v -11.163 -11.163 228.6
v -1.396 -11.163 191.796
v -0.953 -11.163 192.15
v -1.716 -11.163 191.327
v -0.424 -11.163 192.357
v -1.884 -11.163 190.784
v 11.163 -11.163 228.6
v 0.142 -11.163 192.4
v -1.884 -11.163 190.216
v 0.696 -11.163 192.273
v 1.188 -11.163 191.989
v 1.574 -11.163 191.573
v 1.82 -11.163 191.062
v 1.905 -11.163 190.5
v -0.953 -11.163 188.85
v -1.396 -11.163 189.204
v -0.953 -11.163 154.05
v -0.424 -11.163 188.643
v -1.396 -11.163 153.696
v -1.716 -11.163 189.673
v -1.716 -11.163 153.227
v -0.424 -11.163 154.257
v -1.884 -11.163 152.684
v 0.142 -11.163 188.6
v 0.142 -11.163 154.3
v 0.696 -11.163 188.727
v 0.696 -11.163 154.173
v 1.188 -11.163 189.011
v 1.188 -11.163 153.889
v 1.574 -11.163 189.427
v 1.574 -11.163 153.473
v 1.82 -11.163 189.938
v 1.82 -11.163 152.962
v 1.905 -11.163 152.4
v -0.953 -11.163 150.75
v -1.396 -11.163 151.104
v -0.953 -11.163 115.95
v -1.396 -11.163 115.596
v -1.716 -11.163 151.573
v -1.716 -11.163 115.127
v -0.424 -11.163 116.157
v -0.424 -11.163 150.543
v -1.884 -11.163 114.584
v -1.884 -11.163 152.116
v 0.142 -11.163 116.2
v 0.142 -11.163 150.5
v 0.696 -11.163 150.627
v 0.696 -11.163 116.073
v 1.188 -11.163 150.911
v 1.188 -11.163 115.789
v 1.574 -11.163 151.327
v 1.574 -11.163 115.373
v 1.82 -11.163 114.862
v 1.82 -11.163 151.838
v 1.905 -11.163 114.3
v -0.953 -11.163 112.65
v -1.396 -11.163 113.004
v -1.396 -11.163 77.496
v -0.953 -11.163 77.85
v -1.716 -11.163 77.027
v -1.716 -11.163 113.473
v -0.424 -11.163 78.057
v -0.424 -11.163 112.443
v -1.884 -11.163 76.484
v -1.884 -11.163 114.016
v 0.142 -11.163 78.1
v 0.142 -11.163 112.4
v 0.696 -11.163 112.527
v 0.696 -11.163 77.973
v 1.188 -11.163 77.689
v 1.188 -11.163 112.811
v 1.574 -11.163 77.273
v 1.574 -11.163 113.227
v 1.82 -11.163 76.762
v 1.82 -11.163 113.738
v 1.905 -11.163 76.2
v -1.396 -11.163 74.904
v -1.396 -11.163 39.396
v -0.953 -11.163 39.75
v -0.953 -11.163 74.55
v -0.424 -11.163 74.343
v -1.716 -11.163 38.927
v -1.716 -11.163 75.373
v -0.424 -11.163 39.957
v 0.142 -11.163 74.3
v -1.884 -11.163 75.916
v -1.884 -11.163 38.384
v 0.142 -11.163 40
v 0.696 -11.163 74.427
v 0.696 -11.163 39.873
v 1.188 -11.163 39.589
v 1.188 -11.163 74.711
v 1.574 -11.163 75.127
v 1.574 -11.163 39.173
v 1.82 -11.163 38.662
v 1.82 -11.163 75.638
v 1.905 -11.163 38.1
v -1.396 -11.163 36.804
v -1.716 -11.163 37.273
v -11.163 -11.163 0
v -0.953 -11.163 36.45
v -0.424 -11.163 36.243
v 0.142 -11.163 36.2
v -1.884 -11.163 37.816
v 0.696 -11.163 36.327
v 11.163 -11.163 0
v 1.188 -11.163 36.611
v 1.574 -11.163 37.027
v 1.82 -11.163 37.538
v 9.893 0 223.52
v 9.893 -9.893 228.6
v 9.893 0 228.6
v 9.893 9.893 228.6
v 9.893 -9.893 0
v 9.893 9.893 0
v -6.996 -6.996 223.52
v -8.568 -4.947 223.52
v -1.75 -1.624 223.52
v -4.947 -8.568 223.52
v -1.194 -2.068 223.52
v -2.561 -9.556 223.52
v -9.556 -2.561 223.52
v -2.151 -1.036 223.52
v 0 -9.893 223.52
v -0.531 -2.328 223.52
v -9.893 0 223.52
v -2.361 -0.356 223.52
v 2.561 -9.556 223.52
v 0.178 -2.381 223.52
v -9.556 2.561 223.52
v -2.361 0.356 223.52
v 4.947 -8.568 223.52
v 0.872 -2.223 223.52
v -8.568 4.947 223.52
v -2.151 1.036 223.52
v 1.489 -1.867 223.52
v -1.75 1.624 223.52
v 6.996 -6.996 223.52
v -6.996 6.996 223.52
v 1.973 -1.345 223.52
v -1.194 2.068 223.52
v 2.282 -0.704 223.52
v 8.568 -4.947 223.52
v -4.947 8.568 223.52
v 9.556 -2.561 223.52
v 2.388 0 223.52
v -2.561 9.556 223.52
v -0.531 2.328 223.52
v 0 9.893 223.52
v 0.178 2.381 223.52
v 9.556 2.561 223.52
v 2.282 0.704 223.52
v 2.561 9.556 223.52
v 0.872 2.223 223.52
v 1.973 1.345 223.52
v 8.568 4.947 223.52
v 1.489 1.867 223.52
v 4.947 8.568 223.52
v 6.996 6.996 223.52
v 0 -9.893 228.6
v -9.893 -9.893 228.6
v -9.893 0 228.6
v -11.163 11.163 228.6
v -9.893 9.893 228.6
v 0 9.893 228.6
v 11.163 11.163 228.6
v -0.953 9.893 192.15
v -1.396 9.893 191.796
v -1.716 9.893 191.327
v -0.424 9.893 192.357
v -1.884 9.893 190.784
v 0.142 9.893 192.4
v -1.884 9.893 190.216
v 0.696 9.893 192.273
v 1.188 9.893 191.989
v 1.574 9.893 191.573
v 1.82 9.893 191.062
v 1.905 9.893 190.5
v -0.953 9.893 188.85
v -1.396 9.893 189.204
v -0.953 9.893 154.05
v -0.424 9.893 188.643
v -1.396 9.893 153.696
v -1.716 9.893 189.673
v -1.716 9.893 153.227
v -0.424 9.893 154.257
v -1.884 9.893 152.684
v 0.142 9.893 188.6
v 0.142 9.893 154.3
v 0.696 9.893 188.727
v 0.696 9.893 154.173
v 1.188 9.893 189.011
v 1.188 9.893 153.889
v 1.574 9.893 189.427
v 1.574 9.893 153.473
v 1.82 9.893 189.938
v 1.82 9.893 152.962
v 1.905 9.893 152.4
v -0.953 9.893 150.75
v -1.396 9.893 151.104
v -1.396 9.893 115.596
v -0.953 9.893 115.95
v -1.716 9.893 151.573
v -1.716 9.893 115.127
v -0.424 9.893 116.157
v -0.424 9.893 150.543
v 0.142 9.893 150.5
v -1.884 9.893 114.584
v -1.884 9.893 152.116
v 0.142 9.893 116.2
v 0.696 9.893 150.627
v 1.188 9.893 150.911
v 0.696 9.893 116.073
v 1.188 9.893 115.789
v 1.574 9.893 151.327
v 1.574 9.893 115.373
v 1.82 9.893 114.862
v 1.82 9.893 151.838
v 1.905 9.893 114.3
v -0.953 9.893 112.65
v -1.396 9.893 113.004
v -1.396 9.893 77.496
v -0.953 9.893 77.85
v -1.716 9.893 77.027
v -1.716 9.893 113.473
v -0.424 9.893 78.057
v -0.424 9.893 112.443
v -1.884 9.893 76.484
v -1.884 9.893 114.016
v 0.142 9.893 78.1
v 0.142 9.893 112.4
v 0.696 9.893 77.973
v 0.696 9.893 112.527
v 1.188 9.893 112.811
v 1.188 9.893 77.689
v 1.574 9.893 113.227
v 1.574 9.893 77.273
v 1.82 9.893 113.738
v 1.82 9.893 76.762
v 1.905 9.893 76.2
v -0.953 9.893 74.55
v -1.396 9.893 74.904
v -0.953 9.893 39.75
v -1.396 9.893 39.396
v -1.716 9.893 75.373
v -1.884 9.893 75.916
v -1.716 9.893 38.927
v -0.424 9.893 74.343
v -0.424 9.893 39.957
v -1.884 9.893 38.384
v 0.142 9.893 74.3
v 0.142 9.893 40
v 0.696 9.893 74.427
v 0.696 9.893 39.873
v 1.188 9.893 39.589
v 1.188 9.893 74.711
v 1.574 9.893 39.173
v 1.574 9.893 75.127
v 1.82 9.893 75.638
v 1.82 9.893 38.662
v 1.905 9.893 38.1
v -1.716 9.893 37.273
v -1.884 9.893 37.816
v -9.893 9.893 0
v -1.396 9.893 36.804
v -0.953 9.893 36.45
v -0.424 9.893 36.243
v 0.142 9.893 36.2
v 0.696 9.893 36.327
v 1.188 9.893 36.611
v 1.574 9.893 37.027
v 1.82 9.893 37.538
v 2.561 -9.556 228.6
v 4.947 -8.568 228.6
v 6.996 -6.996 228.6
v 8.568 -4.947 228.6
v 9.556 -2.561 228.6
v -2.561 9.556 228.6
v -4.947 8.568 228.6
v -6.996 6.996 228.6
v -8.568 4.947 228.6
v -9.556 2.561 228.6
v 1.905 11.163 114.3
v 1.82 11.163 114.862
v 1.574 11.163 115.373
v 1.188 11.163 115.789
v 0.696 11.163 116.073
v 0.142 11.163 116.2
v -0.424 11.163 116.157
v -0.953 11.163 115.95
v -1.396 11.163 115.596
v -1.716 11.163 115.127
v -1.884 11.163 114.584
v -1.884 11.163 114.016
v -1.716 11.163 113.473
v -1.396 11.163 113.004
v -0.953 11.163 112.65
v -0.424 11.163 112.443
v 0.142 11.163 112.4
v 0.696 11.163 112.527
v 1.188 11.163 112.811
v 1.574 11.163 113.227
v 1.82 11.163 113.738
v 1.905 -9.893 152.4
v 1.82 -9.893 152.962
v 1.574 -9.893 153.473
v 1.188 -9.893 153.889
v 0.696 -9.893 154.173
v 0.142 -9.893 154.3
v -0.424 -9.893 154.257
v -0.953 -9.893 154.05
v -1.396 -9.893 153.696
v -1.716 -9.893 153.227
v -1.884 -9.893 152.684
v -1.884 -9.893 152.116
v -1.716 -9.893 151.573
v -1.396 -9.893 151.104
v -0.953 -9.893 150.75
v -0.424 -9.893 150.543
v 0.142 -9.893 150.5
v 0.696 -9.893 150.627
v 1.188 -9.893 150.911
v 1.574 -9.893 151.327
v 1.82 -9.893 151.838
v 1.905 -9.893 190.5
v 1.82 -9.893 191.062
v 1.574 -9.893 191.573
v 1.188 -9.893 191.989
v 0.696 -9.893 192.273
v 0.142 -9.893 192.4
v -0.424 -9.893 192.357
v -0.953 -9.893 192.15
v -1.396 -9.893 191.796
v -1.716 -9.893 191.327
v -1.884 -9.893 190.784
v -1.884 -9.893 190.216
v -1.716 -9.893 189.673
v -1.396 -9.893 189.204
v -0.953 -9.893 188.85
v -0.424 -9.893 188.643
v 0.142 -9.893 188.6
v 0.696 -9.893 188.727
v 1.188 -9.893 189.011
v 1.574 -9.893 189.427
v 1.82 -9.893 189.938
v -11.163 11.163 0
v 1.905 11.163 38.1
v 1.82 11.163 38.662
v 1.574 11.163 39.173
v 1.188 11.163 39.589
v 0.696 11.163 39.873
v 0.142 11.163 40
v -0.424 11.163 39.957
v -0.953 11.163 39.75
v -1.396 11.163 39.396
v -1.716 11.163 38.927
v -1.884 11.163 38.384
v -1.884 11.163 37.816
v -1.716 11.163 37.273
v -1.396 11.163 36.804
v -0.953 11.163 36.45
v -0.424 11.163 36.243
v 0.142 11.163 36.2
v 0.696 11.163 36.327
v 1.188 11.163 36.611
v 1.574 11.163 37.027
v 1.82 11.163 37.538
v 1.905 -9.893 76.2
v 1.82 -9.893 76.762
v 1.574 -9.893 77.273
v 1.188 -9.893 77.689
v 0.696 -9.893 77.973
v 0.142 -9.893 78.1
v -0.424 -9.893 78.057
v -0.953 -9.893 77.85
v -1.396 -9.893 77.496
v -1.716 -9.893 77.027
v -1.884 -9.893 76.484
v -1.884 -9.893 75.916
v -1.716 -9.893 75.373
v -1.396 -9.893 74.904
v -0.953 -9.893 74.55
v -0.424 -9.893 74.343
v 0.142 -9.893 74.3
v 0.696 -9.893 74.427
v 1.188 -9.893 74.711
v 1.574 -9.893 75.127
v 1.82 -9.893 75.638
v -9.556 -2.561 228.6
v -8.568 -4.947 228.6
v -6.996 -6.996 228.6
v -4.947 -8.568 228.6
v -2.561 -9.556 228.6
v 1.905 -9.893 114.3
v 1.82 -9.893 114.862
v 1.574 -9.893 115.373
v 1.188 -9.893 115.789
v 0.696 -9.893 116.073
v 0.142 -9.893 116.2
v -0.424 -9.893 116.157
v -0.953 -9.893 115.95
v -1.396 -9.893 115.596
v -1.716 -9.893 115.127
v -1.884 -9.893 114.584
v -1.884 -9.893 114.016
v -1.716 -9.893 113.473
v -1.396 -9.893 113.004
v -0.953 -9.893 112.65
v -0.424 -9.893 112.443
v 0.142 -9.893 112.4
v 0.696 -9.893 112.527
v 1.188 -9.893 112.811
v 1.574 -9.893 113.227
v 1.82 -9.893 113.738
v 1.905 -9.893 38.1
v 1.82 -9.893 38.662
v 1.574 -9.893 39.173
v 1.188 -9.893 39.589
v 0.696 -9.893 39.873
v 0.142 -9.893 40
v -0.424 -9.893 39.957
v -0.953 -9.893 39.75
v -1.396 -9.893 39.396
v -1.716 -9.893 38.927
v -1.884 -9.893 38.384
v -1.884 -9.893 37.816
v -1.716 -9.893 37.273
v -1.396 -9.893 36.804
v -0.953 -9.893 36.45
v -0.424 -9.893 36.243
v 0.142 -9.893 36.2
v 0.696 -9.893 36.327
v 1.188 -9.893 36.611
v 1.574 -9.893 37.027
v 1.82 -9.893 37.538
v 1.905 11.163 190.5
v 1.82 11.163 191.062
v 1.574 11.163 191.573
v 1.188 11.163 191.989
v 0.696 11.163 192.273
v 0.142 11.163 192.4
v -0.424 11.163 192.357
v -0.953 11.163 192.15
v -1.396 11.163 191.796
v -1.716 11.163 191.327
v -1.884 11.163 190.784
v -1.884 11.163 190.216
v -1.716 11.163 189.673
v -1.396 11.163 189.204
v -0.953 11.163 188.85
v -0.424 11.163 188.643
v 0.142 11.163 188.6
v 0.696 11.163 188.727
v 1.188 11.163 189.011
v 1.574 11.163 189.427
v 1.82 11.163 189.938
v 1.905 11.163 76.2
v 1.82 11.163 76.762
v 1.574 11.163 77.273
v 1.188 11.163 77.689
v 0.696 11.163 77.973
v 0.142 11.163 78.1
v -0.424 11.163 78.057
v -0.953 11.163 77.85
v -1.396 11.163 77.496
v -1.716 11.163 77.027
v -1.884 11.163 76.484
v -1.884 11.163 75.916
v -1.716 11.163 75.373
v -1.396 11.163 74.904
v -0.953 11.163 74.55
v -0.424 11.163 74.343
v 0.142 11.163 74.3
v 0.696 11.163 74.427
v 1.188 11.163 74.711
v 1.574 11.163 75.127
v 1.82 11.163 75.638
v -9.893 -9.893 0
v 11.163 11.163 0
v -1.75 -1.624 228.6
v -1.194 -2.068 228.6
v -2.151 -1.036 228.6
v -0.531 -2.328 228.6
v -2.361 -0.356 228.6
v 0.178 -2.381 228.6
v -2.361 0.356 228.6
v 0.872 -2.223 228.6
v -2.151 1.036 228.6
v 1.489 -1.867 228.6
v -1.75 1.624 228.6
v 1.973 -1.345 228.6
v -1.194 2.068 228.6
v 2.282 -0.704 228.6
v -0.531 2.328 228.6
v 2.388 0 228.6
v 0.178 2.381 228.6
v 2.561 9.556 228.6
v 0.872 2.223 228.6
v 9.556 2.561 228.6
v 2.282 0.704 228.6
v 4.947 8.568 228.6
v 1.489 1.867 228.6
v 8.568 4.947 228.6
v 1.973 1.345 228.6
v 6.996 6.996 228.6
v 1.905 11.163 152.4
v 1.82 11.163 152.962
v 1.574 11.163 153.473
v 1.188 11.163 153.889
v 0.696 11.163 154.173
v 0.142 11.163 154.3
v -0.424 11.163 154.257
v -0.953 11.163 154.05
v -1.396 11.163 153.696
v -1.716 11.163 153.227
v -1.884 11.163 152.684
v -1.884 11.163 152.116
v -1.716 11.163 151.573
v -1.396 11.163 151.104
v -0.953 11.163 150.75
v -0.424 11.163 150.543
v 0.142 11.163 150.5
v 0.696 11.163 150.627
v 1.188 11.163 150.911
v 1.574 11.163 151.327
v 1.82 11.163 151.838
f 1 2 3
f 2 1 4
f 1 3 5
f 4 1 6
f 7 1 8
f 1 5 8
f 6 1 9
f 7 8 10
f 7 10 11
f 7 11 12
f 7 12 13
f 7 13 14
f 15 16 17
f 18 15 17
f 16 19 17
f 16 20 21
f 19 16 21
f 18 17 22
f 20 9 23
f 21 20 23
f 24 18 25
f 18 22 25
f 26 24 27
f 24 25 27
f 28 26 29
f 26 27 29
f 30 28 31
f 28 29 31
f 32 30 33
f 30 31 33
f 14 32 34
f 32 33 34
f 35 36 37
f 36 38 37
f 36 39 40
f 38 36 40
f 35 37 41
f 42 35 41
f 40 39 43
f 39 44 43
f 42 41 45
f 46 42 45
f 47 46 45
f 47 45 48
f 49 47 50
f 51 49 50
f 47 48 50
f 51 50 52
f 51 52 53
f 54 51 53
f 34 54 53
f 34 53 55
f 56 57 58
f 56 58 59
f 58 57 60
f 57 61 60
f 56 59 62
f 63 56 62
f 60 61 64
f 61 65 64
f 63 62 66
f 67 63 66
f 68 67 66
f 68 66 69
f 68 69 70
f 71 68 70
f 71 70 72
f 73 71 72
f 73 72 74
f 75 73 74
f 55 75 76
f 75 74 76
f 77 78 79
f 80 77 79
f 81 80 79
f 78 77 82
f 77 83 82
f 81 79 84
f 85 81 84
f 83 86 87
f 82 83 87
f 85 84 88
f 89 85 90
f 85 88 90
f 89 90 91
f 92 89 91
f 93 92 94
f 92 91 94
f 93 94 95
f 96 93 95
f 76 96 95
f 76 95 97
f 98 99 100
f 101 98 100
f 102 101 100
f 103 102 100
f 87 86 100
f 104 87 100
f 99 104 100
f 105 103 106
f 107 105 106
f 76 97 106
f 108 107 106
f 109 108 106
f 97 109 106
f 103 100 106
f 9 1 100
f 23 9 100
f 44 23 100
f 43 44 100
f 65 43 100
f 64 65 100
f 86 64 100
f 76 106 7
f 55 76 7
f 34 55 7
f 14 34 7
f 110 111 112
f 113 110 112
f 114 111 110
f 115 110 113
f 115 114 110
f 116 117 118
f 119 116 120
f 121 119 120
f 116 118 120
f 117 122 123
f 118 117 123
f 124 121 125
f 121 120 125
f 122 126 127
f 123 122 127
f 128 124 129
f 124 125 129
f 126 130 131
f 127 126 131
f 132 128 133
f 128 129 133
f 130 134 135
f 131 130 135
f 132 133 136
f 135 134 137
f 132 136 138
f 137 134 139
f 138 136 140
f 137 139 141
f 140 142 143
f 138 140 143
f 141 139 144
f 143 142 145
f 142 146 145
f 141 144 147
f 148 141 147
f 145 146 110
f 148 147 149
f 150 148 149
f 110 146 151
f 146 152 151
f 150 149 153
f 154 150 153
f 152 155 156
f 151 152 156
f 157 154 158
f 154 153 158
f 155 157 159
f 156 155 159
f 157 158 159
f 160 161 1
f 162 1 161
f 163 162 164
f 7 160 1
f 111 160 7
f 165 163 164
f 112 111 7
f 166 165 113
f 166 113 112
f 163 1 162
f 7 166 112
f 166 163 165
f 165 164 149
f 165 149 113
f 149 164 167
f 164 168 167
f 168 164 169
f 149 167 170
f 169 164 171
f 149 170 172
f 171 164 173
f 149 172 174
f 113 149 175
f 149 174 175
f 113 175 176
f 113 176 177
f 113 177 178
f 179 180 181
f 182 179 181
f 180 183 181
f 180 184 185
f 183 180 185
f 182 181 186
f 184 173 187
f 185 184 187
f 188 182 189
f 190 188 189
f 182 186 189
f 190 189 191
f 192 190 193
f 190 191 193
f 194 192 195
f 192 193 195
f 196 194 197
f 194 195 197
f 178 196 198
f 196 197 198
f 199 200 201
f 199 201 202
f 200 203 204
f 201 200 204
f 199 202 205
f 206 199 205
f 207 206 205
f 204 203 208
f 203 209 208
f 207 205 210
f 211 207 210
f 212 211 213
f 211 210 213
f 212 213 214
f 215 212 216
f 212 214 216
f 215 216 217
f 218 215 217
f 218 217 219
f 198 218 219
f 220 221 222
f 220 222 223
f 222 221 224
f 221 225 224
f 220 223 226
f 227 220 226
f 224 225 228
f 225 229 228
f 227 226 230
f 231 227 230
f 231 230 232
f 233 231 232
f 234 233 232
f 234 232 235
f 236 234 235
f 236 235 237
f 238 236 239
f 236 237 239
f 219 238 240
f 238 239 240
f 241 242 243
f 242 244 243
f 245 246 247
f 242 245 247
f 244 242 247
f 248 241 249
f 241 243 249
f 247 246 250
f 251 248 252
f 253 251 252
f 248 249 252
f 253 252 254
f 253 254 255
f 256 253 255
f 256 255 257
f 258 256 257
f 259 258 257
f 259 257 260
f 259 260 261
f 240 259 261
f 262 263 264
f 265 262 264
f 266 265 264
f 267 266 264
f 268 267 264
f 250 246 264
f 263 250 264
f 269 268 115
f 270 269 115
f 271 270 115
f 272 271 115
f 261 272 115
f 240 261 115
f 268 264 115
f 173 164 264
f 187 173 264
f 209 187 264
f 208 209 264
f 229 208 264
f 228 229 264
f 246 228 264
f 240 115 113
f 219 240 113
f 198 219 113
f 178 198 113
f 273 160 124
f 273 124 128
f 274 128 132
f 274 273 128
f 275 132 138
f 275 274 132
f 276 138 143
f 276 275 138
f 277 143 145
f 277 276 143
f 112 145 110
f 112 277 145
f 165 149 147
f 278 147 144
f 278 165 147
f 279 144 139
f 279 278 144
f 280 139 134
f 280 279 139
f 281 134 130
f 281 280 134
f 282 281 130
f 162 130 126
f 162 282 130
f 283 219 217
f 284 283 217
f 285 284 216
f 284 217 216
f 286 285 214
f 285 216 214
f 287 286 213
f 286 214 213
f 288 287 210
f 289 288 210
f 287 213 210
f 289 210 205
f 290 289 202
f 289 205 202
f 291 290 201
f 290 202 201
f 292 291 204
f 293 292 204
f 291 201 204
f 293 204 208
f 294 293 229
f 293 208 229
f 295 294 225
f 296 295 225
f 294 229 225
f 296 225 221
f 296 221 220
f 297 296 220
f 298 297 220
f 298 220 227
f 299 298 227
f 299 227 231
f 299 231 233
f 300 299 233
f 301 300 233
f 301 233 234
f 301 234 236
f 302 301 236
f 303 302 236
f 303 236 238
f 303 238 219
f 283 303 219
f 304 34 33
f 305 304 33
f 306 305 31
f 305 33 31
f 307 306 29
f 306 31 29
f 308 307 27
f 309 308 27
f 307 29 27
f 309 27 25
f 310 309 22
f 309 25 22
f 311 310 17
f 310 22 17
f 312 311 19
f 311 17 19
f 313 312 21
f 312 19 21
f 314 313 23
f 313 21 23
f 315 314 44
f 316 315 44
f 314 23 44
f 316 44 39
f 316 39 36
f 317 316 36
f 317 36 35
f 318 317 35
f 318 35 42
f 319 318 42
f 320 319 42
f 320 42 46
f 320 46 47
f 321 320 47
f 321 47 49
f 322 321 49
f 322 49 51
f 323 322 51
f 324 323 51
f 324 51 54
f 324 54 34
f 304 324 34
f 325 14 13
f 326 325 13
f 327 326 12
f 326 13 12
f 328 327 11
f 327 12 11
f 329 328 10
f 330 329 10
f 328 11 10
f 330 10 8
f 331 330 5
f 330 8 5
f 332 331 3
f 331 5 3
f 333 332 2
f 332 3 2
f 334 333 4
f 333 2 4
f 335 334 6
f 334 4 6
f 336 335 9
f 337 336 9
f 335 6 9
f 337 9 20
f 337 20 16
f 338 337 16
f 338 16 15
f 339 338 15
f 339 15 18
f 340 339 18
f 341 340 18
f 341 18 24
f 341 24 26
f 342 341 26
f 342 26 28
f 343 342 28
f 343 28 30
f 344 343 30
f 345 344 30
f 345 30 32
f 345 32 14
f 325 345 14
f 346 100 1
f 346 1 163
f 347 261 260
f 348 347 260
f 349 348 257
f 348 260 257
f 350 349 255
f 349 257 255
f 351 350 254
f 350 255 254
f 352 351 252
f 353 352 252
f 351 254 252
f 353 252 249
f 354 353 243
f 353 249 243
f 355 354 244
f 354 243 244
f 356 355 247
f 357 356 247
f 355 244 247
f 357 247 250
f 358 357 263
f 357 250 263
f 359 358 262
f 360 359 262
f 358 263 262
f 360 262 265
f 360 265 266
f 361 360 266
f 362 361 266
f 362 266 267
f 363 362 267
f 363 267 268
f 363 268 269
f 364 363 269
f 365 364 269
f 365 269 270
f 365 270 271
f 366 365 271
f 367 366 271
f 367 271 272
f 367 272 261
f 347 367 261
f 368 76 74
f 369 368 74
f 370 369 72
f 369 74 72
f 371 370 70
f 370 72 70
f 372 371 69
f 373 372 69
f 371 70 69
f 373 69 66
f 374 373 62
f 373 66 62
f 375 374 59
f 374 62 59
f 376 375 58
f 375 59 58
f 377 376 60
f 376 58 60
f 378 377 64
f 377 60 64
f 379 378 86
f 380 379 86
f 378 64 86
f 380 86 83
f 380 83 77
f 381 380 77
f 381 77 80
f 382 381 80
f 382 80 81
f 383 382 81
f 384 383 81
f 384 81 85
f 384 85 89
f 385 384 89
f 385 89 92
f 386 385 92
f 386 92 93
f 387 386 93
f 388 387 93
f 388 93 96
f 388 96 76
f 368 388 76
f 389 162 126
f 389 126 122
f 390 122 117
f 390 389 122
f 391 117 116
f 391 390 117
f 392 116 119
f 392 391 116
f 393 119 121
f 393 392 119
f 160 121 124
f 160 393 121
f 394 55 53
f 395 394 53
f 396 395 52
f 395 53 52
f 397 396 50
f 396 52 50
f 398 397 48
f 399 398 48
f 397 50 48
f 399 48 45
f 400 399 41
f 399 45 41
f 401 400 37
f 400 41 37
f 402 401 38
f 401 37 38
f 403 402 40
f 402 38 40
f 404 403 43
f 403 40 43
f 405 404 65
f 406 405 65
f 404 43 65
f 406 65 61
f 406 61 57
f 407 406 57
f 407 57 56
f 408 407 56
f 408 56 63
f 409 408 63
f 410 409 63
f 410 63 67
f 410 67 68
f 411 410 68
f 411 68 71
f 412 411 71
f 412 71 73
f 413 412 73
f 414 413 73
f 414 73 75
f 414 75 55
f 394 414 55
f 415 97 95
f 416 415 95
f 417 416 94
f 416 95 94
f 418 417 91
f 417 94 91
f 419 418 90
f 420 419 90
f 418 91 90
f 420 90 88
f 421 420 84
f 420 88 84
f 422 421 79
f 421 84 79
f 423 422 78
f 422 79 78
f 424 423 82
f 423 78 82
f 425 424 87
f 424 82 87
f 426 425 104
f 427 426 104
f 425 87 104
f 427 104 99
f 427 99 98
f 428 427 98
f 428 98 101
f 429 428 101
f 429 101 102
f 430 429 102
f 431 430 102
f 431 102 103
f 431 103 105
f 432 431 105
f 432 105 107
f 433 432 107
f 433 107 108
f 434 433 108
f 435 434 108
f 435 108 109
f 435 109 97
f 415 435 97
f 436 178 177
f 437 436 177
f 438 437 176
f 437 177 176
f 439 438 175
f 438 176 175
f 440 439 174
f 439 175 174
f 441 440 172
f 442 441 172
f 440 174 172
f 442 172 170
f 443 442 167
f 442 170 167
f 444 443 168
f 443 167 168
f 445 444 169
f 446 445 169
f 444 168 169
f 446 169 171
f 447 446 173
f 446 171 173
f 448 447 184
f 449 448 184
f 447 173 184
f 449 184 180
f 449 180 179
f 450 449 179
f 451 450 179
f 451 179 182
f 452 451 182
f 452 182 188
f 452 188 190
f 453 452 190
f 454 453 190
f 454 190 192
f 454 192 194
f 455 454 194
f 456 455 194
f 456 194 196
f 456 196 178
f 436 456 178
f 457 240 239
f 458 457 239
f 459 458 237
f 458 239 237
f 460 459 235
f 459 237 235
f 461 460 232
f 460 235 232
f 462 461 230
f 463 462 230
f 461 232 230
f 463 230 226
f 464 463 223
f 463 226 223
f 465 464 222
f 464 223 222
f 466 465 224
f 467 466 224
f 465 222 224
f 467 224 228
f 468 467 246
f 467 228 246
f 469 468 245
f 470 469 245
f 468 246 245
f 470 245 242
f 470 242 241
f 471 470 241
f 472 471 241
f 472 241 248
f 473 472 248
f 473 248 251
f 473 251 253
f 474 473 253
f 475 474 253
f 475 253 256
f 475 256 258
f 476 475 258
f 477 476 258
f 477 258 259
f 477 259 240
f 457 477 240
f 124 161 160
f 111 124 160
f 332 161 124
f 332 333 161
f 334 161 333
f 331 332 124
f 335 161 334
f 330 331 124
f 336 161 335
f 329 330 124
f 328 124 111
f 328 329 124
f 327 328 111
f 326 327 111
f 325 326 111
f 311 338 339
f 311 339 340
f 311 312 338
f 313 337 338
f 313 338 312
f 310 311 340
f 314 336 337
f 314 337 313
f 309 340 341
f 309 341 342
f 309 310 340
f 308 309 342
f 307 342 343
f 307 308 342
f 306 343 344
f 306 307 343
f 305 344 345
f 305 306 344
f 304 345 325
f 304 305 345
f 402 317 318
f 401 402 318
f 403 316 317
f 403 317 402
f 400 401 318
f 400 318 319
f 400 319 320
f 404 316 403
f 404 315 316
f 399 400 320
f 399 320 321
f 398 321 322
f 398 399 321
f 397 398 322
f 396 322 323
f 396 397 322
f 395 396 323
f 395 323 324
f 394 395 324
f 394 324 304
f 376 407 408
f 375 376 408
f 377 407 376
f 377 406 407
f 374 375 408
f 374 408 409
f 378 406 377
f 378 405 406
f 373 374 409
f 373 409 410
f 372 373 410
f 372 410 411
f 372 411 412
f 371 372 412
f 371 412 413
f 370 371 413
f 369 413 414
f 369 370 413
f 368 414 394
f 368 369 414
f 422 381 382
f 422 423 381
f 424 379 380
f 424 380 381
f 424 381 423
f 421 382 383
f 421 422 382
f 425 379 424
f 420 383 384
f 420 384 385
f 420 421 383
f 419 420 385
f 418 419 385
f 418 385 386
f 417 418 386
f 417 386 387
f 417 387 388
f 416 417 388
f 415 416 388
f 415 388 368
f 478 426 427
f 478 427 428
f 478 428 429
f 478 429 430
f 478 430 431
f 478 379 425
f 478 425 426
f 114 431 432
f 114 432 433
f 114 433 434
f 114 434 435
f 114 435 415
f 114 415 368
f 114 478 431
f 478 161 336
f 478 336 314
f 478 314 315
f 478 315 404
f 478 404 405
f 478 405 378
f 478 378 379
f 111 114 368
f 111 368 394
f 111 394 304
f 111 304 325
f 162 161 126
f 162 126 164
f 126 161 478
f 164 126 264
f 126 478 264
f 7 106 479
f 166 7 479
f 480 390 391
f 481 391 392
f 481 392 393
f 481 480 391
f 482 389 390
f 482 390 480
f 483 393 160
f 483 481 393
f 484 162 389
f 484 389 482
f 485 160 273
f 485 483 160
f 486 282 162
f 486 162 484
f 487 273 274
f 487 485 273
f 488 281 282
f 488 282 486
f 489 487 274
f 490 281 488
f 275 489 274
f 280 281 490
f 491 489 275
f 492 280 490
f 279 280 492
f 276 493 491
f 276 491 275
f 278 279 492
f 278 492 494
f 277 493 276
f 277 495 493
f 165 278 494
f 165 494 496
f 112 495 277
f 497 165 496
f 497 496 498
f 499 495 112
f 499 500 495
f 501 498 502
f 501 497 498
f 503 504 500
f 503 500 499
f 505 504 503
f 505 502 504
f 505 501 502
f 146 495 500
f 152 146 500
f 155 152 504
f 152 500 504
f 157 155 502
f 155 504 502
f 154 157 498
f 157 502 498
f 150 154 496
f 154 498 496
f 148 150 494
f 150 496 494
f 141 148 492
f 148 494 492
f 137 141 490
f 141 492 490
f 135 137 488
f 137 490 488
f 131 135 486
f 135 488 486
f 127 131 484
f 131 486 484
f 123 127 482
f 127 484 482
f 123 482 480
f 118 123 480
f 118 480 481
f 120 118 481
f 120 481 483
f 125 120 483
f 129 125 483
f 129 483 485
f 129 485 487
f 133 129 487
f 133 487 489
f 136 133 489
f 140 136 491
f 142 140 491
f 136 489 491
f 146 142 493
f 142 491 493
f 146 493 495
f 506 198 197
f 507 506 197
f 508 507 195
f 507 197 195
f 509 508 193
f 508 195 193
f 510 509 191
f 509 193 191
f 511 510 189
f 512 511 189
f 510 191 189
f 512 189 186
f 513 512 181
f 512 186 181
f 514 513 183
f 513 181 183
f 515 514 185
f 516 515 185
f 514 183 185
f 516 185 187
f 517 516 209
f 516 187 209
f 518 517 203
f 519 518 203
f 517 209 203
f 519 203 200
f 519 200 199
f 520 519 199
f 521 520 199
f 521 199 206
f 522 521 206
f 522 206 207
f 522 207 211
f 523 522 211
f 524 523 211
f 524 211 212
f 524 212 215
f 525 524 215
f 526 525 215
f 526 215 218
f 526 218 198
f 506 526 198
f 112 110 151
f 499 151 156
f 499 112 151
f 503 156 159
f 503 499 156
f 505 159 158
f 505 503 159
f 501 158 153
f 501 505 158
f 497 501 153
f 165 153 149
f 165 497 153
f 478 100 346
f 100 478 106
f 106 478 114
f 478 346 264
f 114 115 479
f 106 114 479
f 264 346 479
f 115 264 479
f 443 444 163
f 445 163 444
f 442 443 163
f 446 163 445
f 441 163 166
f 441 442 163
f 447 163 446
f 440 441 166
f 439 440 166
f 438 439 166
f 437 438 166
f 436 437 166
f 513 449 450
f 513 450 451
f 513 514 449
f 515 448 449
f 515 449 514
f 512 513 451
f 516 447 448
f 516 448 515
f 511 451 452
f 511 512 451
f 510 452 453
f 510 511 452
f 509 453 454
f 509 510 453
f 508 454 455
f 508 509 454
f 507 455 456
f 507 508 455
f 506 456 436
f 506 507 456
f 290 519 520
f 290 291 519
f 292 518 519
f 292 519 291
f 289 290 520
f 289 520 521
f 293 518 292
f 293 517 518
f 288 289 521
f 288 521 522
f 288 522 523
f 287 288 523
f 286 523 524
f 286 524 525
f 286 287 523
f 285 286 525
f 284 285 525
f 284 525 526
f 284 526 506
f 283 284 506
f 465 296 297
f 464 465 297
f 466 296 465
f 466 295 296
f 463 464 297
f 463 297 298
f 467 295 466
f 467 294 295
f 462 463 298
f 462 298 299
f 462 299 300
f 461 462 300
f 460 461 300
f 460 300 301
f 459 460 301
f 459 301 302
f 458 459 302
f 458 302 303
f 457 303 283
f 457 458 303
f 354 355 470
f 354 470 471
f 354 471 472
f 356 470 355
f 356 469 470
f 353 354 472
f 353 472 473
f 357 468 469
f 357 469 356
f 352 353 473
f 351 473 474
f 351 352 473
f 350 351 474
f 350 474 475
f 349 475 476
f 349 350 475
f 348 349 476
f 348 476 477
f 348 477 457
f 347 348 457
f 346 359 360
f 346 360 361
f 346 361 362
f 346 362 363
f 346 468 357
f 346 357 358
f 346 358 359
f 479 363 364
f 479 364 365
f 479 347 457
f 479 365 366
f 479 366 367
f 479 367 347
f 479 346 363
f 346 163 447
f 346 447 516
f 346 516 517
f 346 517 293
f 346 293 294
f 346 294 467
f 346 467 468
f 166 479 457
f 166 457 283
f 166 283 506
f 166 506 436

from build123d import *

# Parameters (mm, degrees)
F0_W     = 22.3266
F0_H     = 22.3266
F0_W_2   = 19.7866
F0_H_2   = 19.7866
F1_DEPTH = 228.6
F2_R     = 1.905
F3_DEPTH = 22.3276
F4_R     = 9.8933
F4_R_2   = 2.3876
F5_DEPTH = 5.08


with BuildPart() as f1:
    # F0 (on Top) → F1 (new body)
    with BuildSketch(Plane.XY):
        Rectangle(F0_W, F0_H)
        Rectangle(F0_W_2, F0_H_2, mode=Mode.SUBTRACT)
    extrude(amount=F1_DEPTH)

    # F2 (on face) → F3 (cut, through all)
    with BuildSketch(Plane.XZ.offset(11.1633)):
        with Locations((0, 38.1)):
            Circle(F2_R)
        with Locations((0, 76.2)):
            Circle(F2_R)
        with Locations((0, 114.3)):
            Circle(F2_R)
        with Locations((0, 152.4)):
            Circle(F2_R)
        with Locations((0, 190.5)):
            Circle(F2_R)
    extrude(amount=-F3_DEPTH, mode=Mode.SUBTRACT)

    # F4 (on face) → F5 (join)
    with BuildSketch(Plane.XY.offset(228.6)):
        Circle(F4_R)
        Circle(F4_R_2, mode=Mode.SUBTRACT)
    extrude(amount=-F5_DEPTH)


solid = f1.part
